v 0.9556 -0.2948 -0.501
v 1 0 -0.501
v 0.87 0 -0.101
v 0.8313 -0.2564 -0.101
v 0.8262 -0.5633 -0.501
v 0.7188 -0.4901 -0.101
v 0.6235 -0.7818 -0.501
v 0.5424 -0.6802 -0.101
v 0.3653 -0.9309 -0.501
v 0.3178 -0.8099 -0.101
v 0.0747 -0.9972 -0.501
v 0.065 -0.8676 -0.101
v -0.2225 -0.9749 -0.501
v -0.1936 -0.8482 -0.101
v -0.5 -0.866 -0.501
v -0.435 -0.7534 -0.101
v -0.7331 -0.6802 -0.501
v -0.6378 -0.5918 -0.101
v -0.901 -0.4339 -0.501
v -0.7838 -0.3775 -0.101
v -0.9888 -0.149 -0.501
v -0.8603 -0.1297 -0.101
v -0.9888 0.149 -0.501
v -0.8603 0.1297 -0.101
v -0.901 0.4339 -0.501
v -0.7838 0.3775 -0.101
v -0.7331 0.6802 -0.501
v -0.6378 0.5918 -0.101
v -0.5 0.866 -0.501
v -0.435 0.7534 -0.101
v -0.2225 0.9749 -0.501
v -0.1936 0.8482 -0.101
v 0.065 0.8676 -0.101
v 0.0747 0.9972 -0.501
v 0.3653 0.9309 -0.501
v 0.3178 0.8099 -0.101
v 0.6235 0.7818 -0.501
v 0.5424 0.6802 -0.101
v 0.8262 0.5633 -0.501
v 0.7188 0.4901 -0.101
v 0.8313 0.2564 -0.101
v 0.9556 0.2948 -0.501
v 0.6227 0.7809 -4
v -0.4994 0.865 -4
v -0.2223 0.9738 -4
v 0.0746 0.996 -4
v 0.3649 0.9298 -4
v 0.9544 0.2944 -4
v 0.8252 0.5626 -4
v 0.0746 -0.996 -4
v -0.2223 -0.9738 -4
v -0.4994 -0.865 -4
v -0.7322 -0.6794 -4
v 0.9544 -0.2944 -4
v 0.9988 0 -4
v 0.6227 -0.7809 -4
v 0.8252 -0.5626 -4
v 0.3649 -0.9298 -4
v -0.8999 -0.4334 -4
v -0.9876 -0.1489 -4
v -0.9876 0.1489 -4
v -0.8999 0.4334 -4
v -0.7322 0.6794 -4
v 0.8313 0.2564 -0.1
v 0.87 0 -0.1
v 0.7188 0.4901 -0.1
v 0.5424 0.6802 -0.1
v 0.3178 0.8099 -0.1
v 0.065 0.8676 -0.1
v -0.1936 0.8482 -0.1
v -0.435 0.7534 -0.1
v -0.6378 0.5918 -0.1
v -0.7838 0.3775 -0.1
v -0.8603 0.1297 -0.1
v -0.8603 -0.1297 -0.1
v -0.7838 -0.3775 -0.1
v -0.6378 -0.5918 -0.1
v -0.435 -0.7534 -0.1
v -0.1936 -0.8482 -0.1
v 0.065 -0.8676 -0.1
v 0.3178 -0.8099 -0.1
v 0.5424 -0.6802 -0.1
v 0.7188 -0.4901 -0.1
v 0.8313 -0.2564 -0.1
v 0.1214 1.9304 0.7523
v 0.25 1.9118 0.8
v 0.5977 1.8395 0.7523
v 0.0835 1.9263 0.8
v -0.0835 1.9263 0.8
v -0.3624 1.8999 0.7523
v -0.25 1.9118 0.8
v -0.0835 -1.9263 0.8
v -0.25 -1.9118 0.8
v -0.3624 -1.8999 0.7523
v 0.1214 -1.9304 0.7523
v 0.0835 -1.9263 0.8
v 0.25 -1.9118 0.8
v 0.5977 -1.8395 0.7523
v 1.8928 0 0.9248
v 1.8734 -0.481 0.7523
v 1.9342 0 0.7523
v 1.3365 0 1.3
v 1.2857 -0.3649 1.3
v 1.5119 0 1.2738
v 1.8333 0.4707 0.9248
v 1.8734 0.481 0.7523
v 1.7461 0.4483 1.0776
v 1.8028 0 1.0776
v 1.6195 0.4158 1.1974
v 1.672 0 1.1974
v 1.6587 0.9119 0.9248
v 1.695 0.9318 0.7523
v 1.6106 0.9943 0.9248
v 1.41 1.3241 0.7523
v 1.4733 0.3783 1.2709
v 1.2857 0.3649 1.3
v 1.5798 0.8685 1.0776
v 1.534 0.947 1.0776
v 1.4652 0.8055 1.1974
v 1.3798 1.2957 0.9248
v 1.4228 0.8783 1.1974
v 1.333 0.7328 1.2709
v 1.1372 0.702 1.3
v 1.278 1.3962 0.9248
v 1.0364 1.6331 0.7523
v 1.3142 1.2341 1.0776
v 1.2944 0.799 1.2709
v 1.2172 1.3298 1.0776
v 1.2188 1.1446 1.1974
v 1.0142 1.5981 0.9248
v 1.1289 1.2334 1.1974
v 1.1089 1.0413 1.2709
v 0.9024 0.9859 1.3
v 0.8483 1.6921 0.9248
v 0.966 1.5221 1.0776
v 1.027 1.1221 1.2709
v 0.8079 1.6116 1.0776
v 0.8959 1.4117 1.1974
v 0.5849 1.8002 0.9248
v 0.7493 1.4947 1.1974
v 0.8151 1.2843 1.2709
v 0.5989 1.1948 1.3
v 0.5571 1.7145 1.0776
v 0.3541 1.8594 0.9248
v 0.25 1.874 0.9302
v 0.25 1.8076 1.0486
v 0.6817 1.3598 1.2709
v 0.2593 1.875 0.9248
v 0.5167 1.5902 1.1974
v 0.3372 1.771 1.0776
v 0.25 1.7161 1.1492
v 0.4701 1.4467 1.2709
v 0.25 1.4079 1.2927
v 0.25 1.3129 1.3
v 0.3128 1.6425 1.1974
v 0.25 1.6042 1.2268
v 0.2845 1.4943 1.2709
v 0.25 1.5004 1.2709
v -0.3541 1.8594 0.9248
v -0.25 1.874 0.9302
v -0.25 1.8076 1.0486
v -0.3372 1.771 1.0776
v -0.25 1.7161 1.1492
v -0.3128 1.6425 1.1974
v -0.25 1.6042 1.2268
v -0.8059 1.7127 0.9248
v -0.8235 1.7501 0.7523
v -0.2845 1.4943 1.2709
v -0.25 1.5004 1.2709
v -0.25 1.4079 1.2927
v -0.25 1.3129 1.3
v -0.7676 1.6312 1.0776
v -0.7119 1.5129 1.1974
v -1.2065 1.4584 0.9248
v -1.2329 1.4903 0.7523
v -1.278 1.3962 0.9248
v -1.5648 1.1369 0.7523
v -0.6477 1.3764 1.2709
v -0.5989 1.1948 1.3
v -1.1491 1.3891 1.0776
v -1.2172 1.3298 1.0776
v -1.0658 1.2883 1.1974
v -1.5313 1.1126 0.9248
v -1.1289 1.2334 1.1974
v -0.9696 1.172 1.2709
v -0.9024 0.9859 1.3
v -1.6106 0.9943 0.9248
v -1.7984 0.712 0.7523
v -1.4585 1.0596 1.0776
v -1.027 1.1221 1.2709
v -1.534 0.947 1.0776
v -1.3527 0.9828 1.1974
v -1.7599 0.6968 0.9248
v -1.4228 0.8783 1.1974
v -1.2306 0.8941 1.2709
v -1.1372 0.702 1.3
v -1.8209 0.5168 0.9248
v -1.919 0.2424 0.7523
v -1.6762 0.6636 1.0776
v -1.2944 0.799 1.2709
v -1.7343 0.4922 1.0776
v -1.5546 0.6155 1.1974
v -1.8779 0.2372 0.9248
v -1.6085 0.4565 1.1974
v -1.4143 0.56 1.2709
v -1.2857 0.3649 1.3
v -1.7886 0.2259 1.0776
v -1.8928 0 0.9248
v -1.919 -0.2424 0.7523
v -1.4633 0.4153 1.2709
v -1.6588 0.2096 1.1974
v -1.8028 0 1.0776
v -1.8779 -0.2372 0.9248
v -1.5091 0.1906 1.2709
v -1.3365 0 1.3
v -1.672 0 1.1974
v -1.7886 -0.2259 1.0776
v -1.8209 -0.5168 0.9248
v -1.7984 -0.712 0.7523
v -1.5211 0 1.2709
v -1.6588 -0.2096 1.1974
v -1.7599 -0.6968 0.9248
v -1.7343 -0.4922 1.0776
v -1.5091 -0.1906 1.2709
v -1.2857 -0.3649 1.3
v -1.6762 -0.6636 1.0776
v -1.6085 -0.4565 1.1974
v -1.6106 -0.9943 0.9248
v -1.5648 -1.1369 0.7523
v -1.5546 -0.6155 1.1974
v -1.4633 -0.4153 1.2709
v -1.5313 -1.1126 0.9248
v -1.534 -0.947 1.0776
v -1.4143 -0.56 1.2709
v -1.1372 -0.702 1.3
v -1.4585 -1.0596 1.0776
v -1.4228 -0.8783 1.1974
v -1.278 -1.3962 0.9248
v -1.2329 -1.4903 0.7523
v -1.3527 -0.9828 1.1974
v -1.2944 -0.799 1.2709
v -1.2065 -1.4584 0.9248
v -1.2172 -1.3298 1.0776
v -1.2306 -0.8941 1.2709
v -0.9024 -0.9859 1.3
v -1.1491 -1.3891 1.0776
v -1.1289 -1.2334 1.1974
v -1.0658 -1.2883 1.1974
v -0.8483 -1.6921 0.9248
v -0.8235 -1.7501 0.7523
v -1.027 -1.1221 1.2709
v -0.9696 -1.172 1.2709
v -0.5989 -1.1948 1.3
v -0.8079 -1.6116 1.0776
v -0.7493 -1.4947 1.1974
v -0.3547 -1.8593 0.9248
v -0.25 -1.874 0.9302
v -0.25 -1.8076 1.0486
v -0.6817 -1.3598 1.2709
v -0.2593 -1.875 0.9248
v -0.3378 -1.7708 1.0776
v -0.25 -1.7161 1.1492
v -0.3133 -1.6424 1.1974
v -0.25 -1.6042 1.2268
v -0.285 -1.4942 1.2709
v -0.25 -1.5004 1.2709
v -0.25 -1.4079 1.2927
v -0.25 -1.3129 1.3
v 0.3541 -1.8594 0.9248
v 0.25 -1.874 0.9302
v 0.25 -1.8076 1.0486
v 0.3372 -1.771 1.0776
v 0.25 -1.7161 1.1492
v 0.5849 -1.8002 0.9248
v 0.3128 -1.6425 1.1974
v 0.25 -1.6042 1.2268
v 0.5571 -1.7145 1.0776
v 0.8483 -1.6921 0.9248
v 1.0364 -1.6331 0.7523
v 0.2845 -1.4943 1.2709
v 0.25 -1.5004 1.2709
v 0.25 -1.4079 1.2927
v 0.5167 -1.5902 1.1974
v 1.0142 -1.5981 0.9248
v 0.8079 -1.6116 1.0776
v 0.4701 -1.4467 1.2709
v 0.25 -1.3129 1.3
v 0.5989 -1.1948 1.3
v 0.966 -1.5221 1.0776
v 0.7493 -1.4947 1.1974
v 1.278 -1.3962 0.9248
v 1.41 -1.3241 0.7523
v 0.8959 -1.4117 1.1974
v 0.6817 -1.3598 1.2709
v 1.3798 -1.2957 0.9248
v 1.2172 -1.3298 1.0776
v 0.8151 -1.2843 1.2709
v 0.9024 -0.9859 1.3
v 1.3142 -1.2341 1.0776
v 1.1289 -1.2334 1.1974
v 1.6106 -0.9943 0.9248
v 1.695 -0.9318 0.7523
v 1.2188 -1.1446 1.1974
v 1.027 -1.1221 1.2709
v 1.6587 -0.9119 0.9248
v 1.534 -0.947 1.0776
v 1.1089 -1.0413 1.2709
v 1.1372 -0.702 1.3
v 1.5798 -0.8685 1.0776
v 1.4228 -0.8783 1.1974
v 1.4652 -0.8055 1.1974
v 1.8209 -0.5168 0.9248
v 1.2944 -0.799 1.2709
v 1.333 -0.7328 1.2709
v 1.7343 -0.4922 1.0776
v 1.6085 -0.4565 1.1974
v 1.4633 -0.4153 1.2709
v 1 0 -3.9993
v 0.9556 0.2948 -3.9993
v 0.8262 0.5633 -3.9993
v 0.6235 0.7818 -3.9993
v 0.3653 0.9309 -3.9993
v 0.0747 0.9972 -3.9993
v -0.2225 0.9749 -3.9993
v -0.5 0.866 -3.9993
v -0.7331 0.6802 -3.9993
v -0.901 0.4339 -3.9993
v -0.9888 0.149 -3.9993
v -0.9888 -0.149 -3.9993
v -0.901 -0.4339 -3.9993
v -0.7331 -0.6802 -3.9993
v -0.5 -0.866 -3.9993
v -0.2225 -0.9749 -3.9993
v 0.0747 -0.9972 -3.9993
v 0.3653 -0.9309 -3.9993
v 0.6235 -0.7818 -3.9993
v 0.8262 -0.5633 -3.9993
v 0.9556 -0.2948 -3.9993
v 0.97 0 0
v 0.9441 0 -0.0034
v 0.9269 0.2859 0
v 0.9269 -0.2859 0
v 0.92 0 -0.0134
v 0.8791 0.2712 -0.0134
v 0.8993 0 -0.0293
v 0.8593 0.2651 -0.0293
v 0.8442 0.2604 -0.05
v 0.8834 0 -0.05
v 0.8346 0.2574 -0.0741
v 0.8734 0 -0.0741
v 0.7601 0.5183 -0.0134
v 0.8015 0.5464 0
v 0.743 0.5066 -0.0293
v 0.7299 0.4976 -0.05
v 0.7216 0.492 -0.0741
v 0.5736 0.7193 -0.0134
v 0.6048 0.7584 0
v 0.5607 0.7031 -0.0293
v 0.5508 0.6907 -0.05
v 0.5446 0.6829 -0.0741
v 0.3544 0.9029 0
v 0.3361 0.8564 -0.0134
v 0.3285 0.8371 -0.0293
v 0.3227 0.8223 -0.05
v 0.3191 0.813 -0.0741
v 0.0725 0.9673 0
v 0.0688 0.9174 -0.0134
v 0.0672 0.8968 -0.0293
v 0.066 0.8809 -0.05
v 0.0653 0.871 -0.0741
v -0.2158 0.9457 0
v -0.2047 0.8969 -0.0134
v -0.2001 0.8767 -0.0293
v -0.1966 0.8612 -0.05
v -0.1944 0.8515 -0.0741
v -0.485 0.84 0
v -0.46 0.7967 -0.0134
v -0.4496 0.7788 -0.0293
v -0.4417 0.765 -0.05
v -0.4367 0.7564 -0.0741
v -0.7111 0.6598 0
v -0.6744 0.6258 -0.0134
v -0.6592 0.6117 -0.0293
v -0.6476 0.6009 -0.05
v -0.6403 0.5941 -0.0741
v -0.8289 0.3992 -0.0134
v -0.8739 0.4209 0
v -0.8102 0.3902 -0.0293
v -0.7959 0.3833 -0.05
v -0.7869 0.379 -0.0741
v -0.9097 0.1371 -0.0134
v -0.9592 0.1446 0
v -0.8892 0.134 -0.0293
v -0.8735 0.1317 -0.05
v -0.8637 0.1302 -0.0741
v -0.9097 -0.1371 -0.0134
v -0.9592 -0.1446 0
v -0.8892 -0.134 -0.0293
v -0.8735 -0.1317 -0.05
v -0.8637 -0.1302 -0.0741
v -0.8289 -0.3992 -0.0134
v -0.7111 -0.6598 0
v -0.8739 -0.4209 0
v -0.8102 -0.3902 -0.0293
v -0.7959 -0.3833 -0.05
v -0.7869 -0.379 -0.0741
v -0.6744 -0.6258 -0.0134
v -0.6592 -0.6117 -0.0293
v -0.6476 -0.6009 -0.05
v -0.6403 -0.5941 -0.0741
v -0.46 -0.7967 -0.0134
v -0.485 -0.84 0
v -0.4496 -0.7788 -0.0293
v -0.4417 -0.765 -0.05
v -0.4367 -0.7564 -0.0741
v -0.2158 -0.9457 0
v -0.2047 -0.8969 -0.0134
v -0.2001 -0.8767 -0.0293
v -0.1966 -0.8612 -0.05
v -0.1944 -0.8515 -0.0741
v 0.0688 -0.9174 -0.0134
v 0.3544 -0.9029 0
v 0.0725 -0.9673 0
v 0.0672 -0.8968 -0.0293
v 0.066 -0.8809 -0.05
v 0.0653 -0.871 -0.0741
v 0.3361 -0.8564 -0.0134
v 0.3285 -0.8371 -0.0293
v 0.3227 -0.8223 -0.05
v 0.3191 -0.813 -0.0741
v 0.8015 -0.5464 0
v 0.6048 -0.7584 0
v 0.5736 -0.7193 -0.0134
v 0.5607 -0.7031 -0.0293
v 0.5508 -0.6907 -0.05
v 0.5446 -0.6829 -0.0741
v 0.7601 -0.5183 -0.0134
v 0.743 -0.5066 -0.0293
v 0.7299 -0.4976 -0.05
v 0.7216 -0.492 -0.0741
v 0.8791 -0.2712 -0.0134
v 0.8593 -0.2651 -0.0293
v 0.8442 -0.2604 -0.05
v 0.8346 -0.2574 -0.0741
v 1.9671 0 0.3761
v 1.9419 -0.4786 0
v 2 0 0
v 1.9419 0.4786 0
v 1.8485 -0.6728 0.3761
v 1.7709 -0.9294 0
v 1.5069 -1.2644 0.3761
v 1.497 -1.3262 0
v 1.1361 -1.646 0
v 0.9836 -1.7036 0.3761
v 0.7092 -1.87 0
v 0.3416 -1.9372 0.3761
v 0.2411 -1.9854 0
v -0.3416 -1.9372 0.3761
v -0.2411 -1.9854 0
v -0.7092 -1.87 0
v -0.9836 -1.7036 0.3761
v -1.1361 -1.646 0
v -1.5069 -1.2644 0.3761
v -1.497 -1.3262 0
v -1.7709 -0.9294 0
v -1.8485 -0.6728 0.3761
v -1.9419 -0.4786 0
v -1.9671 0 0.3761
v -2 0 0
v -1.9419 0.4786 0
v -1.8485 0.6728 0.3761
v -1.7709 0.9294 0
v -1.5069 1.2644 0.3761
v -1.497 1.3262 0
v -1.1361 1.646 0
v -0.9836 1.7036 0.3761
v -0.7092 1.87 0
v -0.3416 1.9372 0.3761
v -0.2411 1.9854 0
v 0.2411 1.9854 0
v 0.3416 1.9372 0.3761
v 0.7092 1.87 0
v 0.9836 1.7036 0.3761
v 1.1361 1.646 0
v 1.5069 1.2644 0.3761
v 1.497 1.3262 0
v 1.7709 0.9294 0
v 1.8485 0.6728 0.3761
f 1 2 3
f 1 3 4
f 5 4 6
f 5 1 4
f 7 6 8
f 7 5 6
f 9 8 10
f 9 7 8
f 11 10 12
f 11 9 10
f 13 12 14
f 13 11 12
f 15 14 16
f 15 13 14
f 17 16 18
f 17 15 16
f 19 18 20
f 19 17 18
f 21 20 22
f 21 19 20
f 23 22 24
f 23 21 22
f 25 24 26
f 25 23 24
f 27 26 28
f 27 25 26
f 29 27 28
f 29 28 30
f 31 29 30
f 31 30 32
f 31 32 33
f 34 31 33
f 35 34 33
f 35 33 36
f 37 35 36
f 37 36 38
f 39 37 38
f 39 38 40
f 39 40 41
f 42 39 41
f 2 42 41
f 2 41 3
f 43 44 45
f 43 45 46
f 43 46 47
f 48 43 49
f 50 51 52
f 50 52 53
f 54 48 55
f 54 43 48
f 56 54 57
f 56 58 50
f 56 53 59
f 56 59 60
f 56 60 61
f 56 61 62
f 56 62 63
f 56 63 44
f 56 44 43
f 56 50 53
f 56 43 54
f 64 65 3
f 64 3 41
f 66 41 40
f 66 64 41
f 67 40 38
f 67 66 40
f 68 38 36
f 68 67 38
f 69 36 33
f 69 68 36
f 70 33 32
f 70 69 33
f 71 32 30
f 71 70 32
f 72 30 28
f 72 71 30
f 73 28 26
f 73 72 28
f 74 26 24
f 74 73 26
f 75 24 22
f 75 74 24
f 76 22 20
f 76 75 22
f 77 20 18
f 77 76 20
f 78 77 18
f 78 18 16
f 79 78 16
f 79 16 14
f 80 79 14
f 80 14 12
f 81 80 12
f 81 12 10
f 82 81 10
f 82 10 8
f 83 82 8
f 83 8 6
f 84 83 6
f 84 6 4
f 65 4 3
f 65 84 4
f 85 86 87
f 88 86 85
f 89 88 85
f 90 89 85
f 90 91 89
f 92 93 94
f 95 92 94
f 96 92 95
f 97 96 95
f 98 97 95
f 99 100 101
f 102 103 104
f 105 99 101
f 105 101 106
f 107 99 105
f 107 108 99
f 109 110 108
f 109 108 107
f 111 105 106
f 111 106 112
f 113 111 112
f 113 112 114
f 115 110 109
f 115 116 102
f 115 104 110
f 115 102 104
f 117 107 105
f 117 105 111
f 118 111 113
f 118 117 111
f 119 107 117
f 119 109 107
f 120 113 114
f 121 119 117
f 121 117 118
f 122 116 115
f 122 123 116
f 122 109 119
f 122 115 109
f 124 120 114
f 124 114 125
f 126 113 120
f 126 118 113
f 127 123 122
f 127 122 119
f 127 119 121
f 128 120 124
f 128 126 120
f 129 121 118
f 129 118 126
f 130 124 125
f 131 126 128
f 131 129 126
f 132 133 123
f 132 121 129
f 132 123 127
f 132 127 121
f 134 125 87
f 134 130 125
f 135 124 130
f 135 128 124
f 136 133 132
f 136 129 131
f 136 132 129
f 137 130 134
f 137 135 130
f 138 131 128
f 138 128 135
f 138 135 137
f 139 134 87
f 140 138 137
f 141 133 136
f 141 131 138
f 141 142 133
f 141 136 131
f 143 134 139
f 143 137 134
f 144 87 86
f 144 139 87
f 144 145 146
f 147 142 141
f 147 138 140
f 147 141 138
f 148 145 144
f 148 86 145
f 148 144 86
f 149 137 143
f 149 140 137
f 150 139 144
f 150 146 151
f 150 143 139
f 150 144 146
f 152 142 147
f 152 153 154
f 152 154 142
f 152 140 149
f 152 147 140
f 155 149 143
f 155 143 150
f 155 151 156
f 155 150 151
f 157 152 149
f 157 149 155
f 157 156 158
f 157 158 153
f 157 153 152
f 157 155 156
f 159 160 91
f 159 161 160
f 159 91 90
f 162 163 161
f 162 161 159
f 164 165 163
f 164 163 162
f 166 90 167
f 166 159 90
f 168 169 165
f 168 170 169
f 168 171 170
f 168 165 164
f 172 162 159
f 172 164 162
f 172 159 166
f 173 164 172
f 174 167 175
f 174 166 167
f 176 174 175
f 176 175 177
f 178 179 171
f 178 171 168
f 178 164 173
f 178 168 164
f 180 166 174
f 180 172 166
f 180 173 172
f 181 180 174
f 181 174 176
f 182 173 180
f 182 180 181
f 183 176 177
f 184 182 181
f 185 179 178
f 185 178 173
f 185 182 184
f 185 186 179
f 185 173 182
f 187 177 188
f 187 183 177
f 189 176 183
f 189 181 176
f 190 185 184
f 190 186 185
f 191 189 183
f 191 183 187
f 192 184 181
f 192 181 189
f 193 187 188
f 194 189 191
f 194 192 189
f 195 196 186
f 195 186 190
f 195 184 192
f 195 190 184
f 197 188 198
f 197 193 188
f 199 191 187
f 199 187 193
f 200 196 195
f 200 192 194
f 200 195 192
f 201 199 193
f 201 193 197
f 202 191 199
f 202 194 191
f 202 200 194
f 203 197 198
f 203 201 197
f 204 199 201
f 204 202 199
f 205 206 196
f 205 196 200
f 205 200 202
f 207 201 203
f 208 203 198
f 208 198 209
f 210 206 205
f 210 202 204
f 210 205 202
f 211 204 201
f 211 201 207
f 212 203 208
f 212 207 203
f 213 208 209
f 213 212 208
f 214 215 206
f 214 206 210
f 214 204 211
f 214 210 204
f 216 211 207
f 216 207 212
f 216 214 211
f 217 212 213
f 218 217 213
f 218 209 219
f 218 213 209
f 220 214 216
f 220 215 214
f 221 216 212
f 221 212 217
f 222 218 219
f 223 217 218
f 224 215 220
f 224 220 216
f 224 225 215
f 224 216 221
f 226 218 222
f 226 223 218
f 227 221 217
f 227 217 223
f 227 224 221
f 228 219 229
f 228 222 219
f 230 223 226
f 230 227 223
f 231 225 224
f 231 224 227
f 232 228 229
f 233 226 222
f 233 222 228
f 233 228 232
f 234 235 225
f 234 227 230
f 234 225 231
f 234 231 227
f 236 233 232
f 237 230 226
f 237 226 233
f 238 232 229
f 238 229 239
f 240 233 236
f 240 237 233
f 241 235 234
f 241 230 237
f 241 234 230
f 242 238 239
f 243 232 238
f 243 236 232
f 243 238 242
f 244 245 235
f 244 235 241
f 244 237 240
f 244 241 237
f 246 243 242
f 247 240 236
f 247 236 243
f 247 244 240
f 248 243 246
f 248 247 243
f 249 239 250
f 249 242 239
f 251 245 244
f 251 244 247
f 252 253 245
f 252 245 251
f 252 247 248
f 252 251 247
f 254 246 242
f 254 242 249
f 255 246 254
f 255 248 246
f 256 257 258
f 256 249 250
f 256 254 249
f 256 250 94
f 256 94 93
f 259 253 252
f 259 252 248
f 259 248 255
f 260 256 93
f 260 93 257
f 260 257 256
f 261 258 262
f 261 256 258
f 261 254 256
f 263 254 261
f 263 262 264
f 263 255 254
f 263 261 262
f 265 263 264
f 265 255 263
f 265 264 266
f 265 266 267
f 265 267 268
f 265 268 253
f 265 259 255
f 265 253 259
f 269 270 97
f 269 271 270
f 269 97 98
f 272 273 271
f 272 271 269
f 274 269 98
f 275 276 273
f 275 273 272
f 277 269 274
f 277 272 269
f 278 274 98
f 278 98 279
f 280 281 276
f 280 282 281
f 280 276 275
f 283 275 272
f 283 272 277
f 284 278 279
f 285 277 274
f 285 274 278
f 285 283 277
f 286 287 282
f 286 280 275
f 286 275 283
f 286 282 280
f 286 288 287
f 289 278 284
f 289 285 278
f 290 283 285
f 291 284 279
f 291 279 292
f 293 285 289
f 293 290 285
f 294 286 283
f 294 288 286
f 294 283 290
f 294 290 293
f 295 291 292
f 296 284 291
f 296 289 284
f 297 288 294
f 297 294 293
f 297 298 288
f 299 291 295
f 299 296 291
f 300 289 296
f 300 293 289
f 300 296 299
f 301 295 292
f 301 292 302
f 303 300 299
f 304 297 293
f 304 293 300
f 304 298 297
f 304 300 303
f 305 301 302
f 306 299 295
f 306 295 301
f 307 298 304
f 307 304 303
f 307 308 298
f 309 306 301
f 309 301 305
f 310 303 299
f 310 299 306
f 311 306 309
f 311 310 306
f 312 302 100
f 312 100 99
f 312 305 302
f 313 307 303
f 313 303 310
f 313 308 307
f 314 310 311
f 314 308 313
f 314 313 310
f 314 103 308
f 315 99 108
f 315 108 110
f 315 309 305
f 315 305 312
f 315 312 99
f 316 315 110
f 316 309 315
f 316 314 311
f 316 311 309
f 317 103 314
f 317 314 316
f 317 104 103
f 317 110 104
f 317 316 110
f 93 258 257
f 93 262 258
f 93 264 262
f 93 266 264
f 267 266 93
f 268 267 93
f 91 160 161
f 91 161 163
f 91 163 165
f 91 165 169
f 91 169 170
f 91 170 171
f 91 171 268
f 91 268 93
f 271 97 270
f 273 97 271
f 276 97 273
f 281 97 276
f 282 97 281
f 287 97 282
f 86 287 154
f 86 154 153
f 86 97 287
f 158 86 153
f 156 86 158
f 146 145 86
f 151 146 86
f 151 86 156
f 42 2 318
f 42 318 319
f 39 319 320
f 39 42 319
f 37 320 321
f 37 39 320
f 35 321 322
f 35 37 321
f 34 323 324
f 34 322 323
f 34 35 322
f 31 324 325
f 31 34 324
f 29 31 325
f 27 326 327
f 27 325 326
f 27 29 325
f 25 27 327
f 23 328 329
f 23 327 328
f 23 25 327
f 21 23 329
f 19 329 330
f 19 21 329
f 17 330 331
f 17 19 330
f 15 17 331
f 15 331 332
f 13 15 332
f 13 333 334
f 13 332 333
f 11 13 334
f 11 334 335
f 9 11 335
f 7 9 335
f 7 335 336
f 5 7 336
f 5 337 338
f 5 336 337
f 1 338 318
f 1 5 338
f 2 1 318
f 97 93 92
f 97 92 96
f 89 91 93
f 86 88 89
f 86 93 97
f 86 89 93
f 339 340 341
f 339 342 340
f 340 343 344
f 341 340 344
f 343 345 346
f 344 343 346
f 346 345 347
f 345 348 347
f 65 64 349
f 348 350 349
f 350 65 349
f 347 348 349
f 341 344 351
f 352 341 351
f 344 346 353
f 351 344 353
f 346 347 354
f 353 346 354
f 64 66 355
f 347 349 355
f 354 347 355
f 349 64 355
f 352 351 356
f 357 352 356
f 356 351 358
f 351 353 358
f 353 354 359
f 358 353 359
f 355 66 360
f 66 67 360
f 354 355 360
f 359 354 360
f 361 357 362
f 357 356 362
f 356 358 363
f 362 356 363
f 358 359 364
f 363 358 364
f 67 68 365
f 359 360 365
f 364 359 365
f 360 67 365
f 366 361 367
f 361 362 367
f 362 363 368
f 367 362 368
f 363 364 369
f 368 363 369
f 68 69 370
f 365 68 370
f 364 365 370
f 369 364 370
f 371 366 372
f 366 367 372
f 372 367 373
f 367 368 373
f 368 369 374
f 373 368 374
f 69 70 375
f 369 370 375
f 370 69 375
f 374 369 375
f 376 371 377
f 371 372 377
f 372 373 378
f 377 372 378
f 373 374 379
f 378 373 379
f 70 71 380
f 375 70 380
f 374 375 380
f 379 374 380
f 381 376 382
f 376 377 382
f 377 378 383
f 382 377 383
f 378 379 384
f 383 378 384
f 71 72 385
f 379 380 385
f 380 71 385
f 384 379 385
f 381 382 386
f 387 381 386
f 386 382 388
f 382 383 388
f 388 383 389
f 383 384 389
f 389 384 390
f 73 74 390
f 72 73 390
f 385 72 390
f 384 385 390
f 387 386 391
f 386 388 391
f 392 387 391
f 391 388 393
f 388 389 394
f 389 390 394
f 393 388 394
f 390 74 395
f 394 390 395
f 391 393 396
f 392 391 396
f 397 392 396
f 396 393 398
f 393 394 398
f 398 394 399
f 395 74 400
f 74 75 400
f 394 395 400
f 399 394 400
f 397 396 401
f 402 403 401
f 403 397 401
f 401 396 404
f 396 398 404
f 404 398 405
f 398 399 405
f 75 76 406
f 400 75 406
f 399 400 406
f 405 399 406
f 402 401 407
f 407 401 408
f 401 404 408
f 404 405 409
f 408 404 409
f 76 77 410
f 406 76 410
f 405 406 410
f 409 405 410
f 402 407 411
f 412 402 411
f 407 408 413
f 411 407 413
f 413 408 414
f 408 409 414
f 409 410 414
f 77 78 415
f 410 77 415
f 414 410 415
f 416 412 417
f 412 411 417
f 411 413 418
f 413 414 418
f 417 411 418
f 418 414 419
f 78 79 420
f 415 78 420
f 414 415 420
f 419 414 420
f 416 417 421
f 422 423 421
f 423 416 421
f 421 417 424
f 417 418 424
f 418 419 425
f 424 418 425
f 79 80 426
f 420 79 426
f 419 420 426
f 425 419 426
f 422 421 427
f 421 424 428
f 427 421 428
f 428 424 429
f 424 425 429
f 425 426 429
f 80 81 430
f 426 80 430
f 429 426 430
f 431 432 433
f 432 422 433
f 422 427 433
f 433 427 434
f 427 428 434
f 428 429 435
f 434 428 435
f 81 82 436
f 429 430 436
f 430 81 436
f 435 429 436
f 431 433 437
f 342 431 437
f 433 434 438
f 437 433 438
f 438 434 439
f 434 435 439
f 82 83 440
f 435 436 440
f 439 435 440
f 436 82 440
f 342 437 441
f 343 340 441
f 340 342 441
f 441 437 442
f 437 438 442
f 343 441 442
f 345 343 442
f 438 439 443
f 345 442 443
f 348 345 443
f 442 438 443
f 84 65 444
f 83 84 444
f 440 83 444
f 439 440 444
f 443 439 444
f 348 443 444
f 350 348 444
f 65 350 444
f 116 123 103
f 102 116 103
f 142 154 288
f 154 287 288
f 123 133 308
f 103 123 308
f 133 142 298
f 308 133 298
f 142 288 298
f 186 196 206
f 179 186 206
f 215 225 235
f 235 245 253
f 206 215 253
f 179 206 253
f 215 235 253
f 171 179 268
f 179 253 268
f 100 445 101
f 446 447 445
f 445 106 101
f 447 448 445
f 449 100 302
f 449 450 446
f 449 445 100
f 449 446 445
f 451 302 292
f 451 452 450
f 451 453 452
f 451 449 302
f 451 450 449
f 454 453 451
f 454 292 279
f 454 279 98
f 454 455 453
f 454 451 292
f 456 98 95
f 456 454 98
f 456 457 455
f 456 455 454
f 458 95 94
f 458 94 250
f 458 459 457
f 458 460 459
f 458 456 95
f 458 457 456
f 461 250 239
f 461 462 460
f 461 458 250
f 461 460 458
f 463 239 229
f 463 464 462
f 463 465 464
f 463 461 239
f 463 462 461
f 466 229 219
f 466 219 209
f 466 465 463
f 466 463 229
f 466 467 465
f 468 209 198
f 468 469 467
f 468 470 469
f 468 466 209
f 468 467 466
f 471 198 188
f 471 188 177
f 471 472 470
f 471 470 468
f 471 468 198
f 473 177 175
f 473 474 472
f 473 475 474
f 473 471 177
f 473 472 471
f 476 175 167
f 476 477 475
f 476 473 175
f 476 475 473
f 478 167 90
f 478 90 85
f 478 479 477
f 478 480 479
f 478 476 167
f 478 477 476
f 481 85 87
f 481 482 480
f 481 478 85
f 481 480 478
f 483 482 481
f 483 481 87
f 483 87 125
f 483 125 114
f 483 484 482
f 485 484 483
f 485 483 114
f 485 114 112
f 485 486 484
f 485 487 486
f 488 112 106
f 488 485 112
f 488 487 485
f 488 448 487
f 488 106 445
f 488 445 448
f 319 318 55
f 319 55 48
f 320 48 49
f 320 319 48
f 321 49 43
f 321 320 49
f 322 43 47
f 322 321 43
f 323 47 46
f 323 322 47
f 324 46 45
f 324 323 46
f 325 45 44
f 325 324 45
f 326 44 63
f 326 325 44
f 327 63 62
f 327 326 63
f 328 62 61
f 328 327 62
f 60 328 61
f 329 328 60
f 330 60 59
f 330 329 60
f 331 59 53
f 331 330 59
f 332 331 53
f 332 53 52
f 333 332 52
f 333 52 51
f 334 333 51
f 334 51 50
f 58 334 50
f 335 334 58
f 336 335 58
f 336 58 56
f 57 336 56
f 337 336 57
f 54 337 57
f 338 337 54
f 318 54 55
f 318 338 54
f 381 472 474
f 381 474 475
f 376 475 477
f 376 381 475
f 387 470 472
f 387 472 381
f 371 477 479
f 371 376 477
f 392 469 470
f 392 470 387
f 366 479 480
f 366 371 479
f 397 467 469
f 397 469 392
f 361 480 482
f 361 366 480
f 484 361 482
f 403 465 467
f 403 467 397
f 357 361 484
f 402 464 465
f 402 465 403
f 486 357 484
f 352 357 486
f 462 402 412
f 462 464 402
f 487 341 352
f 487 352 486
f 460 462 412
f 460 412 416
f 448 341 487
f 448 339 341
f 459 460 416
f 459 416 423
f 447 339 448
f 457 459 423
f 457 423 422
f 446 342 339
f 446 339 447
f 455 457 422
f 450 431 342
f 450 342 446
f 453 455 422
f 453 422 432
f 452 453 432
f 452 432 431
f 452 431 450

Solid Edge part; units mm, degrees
sketch "Sketch1" plane through (0, 0, 0) normal (0, -1, 0) x (1, 0, 0)
  line L0 (0, -4) -> (1, -4)
  line L1 (1, -4) -> (1, -0.501)
  line L2 (1, -0.501) -> (0.87, -0.101)
  line L3 (0.87, -0.101) -> (0.87, 0)
  line L4 (0.87, 0) -> (2, 0)
  line L5 (2, 0) -> (1.8863, 1.3)
  line L6 (1.8863, 1.3) -> (0, 1.3)
  dimension "D1" = 1
  dimension "D2" = 0.87
  dimension "D3" = 4
  dimension "D4" = 3.499
  dimension "D5" = 0.4
  dimension "D6" = 2
  dimension "D7" = 1.3
revolve "RevolvedProtrusion1" add sketch "Sketch1" angle 360 about axis through (0, 0, 6) along (0, 0, -1)
fillet "Round_1" radius 0.6 1 edges at (-1.8863, 0, 1.3)
sketch "Sketch2" plane through (0, 0, 0) normal (0, -1, 0) x (1, 0, 0)
  line L0 (-0.25, 1.3) -> (-0.25, 0.8)
  line L1 (-0.25, 0.8) -> (0.25, 0.8)
  line L2 (0.25, 0.8) -> (0.25, 1.3)
  line L3 (0.25, 1.3) -> (-0.25, 1.3)
  dimension "D1" = 0.5
  dimension "D2" = 0.5
  dimension "D3" = 1.3
extrude "ExtrudedCutout_1" cut sketch "Sketch2" along normal mid plane 4
cosmetic_thread "Thread_1" size "M2" thread depth 3.499
fillet "Round_2" radius 0.1 1 edges at (-0.87, 0, 0)
chamfer "Chamfer_1" distance 0.0012 angle 30 1 edges at (-1, 0, -4) measured on face at (0.6867, 0.6467, -4)
properties material "Steel"
